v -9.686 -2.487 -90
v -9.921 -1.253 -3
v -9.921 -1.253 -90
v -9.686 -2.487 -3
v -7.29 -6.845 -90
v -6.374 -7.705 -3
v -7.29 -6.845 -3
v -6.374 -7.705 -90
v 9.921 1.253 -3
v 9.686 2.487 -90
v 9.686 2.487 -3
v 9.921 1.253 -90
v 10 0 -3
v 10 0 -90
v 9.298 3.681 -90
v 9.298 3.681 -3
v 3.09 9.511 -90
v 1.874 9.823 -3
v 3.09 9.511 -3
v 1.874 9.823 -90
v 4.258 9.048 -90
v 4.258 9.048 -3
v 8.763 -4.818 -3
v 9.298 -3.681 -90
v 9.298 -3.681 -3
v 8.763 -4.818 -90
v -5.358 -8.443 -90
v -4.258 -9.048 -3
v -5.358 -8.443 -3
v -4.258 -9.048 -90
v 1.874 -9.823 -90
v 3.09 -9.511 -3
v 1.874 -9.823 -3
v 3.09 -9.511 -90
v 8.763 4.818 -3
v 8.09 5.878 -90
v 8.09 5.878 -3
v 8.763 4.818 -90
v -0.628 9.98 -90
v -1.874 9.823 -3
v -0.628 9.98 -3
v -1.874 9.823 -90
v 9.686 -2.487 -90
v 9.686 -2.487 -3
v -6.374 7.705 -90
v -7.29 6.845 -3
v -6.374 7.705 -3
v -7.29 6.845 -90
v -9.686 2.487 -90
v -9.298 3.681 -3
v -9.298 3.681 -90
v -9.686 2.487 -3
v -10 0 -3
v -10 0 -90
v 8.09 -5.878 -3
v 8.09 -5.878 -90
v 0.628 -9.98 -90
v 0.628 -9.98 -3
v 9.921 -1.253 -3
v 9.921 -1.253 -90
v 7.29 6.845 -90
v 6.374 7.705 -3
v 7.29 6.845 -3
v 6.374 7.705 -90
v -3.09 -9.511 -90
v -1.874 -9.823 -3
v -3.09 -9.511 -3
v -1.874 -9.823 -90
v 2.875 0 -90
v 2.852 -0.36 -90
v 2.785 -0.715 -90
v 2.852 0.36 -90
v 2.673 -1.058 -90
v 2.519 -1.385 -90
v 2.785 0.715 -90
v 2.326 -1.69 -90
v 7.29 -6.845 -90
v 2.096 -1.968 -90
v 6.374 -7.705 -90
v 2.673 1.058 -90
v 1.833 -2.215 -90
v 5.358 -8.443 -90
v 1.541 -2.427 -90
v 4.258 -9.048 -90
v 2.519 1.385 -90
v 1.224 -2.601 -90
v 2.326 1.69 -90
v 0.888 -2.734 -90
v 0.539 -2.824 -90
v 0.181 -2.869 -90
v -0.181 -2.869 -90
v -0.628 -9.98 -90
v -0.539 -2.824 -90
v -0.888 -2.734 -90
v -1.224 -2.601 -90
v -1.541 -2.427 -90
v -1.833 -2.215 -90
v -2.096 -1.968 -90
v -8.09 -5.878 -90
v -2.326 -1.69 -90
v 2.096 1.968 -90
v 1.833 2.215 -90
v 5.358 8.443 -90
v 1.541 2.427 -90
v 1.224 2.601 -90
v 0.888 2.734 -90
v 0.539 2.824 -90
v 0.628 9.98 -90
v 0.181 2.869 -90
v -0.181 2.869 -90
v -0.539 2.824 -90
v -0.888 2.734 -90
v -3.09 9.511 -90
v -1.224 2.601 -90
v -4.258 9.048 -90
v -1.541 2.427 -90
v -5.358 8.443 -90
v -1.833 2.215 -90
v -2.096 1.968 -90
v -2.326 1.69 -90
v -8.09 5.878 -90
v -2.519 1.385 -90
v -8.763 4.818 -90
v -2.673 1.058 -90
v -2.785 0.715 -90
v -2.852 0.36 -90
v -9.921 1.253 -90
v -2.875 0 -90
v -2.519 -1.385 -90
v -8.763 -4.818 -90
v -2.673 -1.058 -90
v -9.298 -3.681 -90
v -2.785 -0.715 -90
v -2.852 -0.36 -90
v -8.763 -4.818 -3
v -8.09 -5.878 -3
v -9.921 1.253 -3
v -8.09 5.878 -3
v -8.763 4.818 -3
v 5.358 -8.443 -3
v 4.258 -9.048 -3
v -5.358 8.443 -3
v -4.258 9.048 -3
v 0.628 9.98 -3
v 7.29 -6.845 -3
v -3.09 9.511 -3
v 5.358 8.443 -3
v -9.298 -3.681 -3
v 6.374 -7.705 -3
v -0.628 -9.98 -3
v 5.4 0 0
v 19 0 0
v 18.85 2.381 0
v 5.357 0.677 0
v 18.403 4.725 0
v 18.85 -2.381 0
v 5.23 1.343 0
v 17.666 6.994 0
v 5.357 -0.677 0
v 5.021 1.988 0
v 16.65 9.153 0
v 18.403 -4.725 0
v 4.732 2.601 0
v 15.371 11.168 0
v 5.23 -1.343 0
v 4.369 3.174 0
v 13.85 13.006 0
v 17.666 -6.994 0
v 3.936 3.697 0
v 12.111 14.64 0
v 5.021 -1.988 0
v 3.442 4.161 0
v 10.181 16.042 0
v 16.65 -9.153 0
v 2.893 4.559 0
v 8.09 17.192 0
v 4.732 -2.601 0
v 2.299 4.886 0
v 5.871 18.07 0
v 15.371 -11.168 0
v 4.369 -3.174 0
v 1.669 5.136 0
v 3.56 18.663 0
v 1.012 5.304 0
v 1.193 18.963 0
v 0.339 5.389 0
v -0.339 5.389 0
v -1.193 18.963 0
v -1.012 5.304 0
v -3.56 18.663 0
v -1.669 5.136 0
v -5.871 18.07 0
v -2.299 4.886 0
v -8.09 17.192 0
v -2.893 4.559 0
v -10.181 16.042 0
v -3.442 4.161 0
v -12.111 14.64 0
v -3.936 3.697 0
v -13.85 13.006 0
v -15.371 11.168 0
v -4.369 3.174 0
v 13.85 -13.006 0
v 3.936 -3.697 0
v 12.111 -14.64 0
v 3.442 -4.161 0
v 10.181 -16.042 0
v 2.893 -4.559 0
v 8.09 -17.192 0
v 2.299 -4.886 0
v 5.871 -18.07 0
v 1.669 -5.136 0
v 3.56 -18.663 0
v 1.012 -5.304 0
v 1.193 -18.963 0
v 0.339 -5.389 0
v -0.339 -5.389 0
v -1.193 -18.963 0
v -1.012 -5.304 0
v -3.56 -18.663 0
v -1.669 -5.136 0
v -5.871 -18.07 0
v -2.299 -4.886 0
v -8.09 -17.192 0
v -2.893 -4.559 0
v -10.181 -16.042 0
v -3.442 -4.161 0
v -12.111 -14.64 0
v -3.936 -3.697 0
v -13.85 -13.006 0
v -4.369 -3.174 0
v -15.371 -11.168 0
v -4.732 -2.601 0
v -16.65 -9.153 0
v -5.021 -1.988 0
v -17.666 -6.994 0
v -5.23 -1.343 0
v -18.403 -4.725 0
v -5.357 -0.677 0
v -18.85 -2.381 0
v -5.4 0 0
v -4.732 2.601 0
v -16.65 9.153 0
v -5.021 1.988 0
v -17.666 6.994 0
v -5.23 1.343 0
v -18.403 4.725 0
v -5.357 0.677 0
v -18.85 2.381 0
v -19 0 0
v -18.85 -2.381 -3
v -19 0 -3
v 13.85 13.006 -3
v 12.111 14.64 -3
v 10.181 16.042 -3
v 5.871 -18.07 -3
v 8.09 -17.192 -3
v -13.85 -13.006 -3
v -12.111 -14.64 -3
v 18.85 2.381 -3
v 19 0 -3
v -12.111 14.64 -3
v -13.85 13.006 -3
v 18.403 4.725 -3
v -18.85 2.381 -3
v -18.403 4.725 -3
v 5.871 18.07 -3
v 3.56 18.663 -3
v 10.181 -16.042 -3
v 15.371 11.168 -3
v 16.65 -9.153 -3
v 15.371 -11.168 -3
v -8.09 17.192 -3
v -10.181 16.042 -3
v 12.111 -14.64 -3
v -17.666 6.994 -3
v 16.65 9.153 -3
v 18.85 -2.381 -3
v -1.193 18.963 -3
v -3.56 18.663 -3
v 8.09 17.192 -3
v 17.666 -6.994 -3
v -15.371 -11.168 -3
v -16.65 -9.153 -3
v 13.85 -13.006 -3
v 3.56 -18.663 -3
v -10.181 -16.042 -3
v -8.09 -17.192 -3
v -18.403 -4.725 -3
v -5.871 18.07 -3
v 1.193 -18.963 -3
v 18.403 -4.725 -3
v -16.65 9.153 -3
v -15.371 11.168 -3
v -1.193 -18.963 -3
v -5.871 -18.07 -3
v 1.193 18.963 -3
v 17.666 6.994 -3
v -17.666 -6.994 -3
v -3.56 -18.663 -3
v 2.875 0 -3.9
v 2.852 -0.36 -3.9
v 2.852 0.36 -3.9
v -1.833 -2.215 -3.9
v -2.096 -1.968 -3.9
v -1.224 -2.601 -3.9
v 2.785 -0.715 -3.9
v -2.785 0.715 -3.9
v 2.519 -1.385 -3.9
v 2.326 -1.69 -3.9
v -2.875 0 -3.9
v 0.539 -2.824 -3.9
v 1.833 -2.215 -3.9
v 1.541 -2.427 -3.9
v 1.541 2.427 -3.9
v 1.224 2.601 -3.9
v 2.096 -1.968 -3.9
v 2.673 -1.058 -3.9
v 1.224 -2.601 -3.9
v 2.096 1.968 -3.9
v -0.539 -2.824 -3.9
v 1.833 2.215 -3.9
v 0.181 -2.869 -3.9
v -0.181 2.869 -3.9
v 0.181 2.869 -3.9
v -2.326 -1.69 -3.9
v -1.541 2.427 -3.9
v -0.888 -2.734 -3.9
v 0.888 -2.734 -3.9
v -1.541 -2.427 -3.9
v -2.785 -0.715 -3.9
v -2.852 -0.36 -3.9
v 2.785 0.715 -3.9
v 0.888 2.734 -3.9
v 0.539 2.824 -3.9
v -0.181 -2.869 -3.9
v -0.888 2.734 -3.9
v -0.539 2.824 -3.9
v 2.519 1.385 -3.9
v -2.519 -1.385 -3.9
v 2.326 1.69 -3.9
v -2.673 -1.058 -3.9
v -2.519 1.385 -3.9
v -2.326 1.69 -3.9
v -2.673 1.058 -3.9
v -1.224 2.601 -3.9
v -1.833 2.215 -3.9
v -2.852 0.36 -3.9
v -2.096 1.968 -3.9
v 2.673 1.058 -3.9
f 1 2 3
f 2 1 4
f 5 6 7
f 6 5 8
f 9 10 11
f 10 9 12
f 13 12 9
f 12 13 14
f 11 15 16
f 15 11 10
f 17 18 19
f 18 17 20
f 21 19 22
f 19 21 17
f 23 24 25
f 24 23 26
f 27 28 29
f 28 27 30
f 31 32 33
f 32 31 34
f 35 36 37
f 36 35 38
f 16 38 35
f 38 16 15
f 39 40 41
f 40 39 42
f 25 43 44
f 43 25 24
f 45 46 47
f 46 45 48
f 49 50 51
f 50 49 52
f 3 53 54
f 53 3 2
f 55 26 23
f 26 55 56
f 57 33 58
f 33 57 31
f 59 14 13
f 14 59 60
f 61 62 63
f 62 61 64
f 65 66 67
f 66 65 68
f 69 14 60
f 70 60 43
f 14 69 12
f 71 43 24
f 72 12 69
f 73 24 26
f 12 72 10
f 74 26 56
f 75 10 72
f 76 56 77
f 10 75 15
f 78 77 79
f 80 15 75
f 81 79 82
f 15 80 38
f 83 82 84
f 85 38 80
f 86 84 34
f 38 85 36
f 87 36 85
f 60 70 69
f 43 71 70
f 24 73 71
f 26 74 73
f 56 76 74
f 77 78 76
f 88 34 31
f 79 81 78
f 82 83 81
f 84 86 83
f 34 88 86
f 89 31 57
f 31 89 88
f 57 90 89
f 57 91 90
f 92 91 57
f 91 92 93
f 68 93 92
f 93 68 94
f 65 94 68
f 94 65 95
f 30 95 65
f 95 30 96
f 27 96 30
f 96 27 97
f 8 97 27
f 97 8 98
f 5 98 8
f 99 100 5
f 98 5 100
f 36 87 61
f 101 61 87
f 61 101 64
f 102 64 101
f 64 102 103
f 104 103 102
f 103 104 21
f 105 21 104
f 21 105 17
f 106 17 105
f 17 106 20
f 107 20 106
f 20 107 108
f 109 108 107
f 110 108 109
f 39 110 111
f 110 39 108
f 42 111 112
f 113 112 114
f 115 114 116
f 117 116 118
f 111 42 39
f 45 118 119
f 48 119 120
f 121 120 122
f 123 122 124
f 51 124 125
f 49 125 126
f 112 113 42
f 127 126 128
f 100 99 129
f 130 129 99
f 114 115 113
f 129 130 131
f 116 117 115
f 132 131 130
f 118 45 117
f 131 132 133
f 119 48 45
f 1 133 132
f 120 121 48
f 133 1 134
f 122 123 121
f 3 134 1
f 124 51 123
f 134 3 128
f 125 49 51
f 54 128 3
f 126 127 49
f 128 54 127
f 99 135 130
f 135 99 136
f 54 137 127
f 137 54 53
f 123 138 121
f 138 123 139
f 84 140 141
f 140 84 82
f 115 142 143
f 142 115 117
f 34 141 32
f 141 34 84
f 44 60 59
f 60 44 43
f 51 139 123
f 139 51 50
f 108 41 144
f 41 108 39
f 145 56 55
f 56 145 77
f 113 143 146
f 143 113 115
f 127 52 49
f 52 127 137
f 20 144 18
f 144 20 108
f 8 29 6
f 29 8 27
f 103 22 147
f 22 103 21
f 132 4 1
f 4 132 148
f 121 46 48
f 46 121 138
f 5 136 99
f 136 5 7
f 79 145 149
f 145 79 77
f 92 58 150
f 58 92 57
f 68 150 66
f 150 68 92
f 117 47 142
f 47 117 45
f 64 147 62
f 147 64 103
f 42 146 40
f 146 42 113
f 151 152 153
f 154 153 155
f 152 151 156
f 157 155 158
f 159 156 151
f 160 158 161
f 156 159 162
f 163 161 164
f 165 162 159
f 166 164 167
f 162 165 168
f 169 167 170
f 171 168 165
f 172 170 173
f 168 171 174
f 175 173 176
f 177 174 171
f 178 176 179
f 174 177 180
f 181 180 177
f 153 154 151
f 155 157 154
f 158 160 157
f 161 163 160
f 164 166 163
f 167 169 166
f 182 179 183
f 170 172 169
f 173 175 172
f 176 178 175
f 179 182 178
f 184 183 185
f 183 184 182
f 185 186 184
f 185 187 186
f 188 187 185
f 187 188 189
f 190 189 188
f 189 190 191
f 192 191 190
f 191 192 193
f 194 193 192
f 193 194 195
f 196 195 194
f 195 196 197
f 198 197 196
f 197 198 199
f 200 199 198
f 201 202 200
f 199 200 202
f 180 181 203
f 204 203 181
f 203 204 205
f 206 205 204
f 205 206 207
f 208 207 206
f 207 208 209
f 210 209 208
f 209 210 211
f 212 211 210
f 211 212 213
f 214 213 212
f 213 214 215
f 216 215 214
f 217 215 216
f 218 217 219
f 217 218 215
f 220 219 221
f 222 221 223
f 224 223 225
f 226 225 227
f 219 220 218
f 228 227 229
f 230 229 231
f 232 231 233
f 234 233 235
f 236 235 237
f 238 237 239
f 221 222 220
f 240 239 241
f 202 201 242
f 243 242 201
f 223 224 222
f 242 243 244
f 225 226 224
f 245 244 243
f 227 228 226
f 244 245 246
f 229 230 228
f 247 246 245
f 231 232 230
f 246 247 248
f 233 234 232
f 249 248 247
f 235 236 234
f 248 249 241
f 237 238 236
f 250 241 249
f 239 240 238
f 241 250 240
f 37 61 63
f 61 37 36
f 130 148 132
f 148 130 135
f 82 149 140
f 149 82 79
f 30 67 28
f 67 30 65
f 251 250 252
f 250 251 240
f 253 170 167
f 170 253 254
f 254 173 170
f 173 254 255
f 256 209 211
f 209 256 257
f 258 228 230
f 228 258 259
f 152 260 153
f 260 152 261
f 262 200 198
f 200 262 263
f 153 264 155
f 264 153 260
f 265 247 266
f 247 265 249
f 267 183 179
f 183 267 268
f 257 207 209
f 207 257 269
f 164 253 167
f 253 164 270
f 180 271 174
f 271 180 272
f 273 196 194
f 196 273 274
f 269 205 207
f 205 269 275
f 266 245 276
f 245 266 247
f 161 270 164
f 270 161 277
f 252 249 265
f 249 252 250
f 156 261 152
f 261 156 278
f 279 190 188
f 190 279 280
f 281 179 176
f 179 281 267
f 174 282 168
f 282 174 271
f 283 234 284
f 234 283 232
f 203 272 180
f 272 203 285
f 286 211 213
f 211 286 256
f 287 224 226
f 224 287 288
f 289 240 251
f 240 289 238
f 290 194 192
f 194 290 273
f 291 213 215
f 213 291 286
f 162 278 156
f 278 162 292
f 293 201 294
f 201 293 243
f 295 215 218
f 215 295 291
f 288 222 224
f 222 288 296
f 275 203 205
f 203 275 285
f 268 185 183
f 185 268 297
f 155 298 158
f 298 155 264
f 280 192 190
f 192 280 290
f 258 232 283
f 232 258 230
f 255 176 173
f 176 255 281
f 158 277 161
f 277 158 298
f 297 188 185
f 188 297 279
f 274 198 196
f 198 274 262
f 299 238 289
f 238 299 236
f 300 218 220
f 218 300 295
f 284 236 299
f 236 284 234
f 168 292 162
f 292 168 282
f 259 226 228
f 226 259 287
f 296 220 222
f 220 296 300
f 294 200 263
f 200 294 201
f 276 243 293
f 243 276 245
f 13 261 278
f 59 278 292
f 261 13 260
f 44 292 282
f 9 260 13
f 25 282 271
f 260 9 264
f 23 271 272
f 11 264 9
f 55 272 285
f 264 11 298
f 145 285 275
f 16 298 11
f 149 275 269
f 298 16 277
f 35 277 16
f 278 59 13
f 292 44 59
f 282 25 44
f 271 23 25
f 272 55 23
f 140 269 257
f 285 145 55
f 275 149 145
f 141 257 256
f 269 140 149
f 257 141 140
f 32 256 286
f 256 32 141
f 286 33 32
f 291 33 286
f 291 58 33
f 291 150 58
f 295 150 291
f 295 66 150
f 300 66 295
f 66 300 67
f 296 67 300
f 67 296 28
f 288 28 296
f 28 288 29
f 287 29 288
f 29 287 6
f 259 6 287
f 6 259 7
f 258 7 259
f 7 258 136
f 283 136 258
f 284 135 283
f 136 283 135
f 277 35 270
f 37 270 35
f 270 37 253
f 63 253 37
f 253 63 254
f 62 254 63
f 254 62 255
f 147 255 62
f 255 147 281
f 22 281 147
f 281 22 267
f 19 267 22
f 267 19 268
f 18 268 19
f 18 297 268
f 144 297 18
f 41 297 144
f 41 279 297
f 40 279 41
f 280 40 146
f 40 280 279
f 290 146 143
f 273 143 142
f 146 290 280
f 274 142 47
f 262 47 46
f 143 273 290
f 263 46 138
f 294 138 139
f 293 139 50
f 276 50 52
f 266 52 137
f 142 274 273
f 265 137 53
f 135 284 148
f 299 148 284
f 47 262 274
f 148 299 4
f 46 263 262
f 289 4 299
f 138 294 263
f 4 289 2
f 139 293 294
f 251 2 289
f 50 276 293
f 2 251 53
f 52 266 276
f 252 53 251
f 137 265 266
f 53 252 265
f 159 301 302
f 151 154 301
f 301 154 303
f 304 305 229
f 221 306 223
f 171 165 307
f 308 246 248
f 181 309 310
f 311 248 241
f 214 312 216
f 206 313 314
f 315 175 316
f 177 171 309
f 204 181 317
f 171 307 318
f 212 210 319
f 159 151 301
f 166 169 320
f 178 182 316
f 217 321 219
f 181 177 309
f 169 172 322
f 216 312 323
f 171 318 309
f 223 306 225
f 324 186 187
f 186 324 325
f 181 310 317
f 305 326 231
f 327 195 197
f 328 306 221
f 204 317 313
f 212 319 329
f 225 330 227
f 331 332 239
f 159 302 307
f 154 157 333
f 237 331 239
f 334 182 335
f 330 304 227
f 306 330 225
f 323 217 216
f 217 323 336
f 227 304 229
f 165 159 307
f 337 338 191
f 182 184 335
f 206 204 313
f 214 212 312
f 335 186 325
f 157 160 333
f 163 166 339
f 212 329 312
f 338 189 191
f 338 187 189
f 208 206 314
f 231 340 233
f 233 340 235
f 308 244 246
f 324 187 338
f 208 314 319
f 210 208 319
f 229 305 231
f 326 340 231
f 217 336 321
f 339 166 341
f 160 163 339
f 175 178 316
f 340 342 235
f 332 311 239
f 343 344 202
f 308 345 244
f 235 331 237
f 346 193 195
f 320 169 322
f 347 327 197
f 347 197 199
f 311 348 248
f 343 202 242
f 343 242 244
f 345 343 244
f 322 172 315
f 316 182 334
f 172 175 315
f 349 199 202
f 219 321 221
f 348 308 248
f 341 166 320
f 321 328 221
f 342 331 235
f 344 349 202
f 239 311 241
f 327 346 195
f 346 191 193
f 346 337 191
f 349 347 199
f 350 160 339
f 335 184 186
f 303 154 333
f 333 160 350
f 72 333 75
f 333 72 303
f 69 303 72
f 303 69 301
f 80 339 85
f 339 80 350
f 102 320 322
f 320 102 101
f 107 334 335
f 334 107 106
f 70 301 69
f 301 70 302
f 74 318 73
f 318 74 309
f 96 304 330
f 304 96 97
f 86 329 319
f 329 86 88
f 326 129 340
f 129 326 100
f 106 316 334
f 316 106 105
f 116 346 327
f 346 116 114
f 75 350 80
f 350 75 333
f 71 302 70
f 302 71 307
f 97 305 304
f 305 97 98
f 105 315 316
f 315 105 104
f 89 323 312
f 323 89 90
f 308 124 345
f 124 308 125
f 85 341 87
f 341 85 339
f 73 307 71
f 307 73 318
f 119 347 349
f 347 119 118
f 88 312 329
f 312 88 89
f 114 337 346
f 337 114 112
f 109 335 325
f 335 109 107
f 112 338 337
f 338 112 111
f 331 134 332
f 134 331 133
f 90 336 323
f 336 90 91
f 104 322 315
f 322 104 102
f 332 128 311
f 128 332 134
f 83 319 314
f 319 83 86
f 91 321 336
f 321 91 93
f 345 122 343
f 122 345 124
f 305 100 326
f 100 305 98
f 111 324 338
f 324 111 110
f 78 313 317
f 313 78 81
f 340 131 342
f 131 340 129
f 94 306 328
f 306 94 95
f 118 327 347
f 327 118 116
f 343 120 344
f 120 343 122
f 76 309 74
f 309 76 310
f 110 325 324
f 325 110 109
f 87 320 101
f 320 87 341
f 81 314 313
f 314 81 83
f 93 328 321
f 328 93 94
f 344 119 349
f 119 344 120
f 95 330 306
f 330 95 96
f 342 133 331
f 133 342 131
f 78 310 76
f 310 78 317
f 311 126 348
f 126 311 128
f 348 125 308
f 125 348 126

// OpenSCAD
$fn = 50;


difference() {
	union() {
		translate(v = [0, 0, -90.0000000000]) {
			cylinder(h = 90, r = 10.0000000000);
		}
		translate(v = [0, 0, -3.0000000000]) {
			cylinder(h = 3, r = 19.0000000000);
		}
	}
	union() {
		translate(v = [0, 0, 0]) {
			rotate(a = [0, 0, 0]) {
				difference() {
					union() {
						#translate(v = [0, 0, -90.0000000000]) {
							cylinder(h = 90, r = 2.6000000000);
						}
						#translate(v = [0, 0, -3.9000000000]) {
							cylinder(h = 3.9000000000, r = 10.0000000000, r1 = 2.8750000000, r2 = 5.4000000000);
						}
						#translate(v = [0, 0, -90.0000000000]) {
							cylinder(h = 90, r = 2.8750000000);
						}
						#translate(v = [0, 0, -90.0000000000]) {
							cylinder(h = 90, r = 2.6000000000);
						}
					}
					union();
				}
			}
		}
	}
}
